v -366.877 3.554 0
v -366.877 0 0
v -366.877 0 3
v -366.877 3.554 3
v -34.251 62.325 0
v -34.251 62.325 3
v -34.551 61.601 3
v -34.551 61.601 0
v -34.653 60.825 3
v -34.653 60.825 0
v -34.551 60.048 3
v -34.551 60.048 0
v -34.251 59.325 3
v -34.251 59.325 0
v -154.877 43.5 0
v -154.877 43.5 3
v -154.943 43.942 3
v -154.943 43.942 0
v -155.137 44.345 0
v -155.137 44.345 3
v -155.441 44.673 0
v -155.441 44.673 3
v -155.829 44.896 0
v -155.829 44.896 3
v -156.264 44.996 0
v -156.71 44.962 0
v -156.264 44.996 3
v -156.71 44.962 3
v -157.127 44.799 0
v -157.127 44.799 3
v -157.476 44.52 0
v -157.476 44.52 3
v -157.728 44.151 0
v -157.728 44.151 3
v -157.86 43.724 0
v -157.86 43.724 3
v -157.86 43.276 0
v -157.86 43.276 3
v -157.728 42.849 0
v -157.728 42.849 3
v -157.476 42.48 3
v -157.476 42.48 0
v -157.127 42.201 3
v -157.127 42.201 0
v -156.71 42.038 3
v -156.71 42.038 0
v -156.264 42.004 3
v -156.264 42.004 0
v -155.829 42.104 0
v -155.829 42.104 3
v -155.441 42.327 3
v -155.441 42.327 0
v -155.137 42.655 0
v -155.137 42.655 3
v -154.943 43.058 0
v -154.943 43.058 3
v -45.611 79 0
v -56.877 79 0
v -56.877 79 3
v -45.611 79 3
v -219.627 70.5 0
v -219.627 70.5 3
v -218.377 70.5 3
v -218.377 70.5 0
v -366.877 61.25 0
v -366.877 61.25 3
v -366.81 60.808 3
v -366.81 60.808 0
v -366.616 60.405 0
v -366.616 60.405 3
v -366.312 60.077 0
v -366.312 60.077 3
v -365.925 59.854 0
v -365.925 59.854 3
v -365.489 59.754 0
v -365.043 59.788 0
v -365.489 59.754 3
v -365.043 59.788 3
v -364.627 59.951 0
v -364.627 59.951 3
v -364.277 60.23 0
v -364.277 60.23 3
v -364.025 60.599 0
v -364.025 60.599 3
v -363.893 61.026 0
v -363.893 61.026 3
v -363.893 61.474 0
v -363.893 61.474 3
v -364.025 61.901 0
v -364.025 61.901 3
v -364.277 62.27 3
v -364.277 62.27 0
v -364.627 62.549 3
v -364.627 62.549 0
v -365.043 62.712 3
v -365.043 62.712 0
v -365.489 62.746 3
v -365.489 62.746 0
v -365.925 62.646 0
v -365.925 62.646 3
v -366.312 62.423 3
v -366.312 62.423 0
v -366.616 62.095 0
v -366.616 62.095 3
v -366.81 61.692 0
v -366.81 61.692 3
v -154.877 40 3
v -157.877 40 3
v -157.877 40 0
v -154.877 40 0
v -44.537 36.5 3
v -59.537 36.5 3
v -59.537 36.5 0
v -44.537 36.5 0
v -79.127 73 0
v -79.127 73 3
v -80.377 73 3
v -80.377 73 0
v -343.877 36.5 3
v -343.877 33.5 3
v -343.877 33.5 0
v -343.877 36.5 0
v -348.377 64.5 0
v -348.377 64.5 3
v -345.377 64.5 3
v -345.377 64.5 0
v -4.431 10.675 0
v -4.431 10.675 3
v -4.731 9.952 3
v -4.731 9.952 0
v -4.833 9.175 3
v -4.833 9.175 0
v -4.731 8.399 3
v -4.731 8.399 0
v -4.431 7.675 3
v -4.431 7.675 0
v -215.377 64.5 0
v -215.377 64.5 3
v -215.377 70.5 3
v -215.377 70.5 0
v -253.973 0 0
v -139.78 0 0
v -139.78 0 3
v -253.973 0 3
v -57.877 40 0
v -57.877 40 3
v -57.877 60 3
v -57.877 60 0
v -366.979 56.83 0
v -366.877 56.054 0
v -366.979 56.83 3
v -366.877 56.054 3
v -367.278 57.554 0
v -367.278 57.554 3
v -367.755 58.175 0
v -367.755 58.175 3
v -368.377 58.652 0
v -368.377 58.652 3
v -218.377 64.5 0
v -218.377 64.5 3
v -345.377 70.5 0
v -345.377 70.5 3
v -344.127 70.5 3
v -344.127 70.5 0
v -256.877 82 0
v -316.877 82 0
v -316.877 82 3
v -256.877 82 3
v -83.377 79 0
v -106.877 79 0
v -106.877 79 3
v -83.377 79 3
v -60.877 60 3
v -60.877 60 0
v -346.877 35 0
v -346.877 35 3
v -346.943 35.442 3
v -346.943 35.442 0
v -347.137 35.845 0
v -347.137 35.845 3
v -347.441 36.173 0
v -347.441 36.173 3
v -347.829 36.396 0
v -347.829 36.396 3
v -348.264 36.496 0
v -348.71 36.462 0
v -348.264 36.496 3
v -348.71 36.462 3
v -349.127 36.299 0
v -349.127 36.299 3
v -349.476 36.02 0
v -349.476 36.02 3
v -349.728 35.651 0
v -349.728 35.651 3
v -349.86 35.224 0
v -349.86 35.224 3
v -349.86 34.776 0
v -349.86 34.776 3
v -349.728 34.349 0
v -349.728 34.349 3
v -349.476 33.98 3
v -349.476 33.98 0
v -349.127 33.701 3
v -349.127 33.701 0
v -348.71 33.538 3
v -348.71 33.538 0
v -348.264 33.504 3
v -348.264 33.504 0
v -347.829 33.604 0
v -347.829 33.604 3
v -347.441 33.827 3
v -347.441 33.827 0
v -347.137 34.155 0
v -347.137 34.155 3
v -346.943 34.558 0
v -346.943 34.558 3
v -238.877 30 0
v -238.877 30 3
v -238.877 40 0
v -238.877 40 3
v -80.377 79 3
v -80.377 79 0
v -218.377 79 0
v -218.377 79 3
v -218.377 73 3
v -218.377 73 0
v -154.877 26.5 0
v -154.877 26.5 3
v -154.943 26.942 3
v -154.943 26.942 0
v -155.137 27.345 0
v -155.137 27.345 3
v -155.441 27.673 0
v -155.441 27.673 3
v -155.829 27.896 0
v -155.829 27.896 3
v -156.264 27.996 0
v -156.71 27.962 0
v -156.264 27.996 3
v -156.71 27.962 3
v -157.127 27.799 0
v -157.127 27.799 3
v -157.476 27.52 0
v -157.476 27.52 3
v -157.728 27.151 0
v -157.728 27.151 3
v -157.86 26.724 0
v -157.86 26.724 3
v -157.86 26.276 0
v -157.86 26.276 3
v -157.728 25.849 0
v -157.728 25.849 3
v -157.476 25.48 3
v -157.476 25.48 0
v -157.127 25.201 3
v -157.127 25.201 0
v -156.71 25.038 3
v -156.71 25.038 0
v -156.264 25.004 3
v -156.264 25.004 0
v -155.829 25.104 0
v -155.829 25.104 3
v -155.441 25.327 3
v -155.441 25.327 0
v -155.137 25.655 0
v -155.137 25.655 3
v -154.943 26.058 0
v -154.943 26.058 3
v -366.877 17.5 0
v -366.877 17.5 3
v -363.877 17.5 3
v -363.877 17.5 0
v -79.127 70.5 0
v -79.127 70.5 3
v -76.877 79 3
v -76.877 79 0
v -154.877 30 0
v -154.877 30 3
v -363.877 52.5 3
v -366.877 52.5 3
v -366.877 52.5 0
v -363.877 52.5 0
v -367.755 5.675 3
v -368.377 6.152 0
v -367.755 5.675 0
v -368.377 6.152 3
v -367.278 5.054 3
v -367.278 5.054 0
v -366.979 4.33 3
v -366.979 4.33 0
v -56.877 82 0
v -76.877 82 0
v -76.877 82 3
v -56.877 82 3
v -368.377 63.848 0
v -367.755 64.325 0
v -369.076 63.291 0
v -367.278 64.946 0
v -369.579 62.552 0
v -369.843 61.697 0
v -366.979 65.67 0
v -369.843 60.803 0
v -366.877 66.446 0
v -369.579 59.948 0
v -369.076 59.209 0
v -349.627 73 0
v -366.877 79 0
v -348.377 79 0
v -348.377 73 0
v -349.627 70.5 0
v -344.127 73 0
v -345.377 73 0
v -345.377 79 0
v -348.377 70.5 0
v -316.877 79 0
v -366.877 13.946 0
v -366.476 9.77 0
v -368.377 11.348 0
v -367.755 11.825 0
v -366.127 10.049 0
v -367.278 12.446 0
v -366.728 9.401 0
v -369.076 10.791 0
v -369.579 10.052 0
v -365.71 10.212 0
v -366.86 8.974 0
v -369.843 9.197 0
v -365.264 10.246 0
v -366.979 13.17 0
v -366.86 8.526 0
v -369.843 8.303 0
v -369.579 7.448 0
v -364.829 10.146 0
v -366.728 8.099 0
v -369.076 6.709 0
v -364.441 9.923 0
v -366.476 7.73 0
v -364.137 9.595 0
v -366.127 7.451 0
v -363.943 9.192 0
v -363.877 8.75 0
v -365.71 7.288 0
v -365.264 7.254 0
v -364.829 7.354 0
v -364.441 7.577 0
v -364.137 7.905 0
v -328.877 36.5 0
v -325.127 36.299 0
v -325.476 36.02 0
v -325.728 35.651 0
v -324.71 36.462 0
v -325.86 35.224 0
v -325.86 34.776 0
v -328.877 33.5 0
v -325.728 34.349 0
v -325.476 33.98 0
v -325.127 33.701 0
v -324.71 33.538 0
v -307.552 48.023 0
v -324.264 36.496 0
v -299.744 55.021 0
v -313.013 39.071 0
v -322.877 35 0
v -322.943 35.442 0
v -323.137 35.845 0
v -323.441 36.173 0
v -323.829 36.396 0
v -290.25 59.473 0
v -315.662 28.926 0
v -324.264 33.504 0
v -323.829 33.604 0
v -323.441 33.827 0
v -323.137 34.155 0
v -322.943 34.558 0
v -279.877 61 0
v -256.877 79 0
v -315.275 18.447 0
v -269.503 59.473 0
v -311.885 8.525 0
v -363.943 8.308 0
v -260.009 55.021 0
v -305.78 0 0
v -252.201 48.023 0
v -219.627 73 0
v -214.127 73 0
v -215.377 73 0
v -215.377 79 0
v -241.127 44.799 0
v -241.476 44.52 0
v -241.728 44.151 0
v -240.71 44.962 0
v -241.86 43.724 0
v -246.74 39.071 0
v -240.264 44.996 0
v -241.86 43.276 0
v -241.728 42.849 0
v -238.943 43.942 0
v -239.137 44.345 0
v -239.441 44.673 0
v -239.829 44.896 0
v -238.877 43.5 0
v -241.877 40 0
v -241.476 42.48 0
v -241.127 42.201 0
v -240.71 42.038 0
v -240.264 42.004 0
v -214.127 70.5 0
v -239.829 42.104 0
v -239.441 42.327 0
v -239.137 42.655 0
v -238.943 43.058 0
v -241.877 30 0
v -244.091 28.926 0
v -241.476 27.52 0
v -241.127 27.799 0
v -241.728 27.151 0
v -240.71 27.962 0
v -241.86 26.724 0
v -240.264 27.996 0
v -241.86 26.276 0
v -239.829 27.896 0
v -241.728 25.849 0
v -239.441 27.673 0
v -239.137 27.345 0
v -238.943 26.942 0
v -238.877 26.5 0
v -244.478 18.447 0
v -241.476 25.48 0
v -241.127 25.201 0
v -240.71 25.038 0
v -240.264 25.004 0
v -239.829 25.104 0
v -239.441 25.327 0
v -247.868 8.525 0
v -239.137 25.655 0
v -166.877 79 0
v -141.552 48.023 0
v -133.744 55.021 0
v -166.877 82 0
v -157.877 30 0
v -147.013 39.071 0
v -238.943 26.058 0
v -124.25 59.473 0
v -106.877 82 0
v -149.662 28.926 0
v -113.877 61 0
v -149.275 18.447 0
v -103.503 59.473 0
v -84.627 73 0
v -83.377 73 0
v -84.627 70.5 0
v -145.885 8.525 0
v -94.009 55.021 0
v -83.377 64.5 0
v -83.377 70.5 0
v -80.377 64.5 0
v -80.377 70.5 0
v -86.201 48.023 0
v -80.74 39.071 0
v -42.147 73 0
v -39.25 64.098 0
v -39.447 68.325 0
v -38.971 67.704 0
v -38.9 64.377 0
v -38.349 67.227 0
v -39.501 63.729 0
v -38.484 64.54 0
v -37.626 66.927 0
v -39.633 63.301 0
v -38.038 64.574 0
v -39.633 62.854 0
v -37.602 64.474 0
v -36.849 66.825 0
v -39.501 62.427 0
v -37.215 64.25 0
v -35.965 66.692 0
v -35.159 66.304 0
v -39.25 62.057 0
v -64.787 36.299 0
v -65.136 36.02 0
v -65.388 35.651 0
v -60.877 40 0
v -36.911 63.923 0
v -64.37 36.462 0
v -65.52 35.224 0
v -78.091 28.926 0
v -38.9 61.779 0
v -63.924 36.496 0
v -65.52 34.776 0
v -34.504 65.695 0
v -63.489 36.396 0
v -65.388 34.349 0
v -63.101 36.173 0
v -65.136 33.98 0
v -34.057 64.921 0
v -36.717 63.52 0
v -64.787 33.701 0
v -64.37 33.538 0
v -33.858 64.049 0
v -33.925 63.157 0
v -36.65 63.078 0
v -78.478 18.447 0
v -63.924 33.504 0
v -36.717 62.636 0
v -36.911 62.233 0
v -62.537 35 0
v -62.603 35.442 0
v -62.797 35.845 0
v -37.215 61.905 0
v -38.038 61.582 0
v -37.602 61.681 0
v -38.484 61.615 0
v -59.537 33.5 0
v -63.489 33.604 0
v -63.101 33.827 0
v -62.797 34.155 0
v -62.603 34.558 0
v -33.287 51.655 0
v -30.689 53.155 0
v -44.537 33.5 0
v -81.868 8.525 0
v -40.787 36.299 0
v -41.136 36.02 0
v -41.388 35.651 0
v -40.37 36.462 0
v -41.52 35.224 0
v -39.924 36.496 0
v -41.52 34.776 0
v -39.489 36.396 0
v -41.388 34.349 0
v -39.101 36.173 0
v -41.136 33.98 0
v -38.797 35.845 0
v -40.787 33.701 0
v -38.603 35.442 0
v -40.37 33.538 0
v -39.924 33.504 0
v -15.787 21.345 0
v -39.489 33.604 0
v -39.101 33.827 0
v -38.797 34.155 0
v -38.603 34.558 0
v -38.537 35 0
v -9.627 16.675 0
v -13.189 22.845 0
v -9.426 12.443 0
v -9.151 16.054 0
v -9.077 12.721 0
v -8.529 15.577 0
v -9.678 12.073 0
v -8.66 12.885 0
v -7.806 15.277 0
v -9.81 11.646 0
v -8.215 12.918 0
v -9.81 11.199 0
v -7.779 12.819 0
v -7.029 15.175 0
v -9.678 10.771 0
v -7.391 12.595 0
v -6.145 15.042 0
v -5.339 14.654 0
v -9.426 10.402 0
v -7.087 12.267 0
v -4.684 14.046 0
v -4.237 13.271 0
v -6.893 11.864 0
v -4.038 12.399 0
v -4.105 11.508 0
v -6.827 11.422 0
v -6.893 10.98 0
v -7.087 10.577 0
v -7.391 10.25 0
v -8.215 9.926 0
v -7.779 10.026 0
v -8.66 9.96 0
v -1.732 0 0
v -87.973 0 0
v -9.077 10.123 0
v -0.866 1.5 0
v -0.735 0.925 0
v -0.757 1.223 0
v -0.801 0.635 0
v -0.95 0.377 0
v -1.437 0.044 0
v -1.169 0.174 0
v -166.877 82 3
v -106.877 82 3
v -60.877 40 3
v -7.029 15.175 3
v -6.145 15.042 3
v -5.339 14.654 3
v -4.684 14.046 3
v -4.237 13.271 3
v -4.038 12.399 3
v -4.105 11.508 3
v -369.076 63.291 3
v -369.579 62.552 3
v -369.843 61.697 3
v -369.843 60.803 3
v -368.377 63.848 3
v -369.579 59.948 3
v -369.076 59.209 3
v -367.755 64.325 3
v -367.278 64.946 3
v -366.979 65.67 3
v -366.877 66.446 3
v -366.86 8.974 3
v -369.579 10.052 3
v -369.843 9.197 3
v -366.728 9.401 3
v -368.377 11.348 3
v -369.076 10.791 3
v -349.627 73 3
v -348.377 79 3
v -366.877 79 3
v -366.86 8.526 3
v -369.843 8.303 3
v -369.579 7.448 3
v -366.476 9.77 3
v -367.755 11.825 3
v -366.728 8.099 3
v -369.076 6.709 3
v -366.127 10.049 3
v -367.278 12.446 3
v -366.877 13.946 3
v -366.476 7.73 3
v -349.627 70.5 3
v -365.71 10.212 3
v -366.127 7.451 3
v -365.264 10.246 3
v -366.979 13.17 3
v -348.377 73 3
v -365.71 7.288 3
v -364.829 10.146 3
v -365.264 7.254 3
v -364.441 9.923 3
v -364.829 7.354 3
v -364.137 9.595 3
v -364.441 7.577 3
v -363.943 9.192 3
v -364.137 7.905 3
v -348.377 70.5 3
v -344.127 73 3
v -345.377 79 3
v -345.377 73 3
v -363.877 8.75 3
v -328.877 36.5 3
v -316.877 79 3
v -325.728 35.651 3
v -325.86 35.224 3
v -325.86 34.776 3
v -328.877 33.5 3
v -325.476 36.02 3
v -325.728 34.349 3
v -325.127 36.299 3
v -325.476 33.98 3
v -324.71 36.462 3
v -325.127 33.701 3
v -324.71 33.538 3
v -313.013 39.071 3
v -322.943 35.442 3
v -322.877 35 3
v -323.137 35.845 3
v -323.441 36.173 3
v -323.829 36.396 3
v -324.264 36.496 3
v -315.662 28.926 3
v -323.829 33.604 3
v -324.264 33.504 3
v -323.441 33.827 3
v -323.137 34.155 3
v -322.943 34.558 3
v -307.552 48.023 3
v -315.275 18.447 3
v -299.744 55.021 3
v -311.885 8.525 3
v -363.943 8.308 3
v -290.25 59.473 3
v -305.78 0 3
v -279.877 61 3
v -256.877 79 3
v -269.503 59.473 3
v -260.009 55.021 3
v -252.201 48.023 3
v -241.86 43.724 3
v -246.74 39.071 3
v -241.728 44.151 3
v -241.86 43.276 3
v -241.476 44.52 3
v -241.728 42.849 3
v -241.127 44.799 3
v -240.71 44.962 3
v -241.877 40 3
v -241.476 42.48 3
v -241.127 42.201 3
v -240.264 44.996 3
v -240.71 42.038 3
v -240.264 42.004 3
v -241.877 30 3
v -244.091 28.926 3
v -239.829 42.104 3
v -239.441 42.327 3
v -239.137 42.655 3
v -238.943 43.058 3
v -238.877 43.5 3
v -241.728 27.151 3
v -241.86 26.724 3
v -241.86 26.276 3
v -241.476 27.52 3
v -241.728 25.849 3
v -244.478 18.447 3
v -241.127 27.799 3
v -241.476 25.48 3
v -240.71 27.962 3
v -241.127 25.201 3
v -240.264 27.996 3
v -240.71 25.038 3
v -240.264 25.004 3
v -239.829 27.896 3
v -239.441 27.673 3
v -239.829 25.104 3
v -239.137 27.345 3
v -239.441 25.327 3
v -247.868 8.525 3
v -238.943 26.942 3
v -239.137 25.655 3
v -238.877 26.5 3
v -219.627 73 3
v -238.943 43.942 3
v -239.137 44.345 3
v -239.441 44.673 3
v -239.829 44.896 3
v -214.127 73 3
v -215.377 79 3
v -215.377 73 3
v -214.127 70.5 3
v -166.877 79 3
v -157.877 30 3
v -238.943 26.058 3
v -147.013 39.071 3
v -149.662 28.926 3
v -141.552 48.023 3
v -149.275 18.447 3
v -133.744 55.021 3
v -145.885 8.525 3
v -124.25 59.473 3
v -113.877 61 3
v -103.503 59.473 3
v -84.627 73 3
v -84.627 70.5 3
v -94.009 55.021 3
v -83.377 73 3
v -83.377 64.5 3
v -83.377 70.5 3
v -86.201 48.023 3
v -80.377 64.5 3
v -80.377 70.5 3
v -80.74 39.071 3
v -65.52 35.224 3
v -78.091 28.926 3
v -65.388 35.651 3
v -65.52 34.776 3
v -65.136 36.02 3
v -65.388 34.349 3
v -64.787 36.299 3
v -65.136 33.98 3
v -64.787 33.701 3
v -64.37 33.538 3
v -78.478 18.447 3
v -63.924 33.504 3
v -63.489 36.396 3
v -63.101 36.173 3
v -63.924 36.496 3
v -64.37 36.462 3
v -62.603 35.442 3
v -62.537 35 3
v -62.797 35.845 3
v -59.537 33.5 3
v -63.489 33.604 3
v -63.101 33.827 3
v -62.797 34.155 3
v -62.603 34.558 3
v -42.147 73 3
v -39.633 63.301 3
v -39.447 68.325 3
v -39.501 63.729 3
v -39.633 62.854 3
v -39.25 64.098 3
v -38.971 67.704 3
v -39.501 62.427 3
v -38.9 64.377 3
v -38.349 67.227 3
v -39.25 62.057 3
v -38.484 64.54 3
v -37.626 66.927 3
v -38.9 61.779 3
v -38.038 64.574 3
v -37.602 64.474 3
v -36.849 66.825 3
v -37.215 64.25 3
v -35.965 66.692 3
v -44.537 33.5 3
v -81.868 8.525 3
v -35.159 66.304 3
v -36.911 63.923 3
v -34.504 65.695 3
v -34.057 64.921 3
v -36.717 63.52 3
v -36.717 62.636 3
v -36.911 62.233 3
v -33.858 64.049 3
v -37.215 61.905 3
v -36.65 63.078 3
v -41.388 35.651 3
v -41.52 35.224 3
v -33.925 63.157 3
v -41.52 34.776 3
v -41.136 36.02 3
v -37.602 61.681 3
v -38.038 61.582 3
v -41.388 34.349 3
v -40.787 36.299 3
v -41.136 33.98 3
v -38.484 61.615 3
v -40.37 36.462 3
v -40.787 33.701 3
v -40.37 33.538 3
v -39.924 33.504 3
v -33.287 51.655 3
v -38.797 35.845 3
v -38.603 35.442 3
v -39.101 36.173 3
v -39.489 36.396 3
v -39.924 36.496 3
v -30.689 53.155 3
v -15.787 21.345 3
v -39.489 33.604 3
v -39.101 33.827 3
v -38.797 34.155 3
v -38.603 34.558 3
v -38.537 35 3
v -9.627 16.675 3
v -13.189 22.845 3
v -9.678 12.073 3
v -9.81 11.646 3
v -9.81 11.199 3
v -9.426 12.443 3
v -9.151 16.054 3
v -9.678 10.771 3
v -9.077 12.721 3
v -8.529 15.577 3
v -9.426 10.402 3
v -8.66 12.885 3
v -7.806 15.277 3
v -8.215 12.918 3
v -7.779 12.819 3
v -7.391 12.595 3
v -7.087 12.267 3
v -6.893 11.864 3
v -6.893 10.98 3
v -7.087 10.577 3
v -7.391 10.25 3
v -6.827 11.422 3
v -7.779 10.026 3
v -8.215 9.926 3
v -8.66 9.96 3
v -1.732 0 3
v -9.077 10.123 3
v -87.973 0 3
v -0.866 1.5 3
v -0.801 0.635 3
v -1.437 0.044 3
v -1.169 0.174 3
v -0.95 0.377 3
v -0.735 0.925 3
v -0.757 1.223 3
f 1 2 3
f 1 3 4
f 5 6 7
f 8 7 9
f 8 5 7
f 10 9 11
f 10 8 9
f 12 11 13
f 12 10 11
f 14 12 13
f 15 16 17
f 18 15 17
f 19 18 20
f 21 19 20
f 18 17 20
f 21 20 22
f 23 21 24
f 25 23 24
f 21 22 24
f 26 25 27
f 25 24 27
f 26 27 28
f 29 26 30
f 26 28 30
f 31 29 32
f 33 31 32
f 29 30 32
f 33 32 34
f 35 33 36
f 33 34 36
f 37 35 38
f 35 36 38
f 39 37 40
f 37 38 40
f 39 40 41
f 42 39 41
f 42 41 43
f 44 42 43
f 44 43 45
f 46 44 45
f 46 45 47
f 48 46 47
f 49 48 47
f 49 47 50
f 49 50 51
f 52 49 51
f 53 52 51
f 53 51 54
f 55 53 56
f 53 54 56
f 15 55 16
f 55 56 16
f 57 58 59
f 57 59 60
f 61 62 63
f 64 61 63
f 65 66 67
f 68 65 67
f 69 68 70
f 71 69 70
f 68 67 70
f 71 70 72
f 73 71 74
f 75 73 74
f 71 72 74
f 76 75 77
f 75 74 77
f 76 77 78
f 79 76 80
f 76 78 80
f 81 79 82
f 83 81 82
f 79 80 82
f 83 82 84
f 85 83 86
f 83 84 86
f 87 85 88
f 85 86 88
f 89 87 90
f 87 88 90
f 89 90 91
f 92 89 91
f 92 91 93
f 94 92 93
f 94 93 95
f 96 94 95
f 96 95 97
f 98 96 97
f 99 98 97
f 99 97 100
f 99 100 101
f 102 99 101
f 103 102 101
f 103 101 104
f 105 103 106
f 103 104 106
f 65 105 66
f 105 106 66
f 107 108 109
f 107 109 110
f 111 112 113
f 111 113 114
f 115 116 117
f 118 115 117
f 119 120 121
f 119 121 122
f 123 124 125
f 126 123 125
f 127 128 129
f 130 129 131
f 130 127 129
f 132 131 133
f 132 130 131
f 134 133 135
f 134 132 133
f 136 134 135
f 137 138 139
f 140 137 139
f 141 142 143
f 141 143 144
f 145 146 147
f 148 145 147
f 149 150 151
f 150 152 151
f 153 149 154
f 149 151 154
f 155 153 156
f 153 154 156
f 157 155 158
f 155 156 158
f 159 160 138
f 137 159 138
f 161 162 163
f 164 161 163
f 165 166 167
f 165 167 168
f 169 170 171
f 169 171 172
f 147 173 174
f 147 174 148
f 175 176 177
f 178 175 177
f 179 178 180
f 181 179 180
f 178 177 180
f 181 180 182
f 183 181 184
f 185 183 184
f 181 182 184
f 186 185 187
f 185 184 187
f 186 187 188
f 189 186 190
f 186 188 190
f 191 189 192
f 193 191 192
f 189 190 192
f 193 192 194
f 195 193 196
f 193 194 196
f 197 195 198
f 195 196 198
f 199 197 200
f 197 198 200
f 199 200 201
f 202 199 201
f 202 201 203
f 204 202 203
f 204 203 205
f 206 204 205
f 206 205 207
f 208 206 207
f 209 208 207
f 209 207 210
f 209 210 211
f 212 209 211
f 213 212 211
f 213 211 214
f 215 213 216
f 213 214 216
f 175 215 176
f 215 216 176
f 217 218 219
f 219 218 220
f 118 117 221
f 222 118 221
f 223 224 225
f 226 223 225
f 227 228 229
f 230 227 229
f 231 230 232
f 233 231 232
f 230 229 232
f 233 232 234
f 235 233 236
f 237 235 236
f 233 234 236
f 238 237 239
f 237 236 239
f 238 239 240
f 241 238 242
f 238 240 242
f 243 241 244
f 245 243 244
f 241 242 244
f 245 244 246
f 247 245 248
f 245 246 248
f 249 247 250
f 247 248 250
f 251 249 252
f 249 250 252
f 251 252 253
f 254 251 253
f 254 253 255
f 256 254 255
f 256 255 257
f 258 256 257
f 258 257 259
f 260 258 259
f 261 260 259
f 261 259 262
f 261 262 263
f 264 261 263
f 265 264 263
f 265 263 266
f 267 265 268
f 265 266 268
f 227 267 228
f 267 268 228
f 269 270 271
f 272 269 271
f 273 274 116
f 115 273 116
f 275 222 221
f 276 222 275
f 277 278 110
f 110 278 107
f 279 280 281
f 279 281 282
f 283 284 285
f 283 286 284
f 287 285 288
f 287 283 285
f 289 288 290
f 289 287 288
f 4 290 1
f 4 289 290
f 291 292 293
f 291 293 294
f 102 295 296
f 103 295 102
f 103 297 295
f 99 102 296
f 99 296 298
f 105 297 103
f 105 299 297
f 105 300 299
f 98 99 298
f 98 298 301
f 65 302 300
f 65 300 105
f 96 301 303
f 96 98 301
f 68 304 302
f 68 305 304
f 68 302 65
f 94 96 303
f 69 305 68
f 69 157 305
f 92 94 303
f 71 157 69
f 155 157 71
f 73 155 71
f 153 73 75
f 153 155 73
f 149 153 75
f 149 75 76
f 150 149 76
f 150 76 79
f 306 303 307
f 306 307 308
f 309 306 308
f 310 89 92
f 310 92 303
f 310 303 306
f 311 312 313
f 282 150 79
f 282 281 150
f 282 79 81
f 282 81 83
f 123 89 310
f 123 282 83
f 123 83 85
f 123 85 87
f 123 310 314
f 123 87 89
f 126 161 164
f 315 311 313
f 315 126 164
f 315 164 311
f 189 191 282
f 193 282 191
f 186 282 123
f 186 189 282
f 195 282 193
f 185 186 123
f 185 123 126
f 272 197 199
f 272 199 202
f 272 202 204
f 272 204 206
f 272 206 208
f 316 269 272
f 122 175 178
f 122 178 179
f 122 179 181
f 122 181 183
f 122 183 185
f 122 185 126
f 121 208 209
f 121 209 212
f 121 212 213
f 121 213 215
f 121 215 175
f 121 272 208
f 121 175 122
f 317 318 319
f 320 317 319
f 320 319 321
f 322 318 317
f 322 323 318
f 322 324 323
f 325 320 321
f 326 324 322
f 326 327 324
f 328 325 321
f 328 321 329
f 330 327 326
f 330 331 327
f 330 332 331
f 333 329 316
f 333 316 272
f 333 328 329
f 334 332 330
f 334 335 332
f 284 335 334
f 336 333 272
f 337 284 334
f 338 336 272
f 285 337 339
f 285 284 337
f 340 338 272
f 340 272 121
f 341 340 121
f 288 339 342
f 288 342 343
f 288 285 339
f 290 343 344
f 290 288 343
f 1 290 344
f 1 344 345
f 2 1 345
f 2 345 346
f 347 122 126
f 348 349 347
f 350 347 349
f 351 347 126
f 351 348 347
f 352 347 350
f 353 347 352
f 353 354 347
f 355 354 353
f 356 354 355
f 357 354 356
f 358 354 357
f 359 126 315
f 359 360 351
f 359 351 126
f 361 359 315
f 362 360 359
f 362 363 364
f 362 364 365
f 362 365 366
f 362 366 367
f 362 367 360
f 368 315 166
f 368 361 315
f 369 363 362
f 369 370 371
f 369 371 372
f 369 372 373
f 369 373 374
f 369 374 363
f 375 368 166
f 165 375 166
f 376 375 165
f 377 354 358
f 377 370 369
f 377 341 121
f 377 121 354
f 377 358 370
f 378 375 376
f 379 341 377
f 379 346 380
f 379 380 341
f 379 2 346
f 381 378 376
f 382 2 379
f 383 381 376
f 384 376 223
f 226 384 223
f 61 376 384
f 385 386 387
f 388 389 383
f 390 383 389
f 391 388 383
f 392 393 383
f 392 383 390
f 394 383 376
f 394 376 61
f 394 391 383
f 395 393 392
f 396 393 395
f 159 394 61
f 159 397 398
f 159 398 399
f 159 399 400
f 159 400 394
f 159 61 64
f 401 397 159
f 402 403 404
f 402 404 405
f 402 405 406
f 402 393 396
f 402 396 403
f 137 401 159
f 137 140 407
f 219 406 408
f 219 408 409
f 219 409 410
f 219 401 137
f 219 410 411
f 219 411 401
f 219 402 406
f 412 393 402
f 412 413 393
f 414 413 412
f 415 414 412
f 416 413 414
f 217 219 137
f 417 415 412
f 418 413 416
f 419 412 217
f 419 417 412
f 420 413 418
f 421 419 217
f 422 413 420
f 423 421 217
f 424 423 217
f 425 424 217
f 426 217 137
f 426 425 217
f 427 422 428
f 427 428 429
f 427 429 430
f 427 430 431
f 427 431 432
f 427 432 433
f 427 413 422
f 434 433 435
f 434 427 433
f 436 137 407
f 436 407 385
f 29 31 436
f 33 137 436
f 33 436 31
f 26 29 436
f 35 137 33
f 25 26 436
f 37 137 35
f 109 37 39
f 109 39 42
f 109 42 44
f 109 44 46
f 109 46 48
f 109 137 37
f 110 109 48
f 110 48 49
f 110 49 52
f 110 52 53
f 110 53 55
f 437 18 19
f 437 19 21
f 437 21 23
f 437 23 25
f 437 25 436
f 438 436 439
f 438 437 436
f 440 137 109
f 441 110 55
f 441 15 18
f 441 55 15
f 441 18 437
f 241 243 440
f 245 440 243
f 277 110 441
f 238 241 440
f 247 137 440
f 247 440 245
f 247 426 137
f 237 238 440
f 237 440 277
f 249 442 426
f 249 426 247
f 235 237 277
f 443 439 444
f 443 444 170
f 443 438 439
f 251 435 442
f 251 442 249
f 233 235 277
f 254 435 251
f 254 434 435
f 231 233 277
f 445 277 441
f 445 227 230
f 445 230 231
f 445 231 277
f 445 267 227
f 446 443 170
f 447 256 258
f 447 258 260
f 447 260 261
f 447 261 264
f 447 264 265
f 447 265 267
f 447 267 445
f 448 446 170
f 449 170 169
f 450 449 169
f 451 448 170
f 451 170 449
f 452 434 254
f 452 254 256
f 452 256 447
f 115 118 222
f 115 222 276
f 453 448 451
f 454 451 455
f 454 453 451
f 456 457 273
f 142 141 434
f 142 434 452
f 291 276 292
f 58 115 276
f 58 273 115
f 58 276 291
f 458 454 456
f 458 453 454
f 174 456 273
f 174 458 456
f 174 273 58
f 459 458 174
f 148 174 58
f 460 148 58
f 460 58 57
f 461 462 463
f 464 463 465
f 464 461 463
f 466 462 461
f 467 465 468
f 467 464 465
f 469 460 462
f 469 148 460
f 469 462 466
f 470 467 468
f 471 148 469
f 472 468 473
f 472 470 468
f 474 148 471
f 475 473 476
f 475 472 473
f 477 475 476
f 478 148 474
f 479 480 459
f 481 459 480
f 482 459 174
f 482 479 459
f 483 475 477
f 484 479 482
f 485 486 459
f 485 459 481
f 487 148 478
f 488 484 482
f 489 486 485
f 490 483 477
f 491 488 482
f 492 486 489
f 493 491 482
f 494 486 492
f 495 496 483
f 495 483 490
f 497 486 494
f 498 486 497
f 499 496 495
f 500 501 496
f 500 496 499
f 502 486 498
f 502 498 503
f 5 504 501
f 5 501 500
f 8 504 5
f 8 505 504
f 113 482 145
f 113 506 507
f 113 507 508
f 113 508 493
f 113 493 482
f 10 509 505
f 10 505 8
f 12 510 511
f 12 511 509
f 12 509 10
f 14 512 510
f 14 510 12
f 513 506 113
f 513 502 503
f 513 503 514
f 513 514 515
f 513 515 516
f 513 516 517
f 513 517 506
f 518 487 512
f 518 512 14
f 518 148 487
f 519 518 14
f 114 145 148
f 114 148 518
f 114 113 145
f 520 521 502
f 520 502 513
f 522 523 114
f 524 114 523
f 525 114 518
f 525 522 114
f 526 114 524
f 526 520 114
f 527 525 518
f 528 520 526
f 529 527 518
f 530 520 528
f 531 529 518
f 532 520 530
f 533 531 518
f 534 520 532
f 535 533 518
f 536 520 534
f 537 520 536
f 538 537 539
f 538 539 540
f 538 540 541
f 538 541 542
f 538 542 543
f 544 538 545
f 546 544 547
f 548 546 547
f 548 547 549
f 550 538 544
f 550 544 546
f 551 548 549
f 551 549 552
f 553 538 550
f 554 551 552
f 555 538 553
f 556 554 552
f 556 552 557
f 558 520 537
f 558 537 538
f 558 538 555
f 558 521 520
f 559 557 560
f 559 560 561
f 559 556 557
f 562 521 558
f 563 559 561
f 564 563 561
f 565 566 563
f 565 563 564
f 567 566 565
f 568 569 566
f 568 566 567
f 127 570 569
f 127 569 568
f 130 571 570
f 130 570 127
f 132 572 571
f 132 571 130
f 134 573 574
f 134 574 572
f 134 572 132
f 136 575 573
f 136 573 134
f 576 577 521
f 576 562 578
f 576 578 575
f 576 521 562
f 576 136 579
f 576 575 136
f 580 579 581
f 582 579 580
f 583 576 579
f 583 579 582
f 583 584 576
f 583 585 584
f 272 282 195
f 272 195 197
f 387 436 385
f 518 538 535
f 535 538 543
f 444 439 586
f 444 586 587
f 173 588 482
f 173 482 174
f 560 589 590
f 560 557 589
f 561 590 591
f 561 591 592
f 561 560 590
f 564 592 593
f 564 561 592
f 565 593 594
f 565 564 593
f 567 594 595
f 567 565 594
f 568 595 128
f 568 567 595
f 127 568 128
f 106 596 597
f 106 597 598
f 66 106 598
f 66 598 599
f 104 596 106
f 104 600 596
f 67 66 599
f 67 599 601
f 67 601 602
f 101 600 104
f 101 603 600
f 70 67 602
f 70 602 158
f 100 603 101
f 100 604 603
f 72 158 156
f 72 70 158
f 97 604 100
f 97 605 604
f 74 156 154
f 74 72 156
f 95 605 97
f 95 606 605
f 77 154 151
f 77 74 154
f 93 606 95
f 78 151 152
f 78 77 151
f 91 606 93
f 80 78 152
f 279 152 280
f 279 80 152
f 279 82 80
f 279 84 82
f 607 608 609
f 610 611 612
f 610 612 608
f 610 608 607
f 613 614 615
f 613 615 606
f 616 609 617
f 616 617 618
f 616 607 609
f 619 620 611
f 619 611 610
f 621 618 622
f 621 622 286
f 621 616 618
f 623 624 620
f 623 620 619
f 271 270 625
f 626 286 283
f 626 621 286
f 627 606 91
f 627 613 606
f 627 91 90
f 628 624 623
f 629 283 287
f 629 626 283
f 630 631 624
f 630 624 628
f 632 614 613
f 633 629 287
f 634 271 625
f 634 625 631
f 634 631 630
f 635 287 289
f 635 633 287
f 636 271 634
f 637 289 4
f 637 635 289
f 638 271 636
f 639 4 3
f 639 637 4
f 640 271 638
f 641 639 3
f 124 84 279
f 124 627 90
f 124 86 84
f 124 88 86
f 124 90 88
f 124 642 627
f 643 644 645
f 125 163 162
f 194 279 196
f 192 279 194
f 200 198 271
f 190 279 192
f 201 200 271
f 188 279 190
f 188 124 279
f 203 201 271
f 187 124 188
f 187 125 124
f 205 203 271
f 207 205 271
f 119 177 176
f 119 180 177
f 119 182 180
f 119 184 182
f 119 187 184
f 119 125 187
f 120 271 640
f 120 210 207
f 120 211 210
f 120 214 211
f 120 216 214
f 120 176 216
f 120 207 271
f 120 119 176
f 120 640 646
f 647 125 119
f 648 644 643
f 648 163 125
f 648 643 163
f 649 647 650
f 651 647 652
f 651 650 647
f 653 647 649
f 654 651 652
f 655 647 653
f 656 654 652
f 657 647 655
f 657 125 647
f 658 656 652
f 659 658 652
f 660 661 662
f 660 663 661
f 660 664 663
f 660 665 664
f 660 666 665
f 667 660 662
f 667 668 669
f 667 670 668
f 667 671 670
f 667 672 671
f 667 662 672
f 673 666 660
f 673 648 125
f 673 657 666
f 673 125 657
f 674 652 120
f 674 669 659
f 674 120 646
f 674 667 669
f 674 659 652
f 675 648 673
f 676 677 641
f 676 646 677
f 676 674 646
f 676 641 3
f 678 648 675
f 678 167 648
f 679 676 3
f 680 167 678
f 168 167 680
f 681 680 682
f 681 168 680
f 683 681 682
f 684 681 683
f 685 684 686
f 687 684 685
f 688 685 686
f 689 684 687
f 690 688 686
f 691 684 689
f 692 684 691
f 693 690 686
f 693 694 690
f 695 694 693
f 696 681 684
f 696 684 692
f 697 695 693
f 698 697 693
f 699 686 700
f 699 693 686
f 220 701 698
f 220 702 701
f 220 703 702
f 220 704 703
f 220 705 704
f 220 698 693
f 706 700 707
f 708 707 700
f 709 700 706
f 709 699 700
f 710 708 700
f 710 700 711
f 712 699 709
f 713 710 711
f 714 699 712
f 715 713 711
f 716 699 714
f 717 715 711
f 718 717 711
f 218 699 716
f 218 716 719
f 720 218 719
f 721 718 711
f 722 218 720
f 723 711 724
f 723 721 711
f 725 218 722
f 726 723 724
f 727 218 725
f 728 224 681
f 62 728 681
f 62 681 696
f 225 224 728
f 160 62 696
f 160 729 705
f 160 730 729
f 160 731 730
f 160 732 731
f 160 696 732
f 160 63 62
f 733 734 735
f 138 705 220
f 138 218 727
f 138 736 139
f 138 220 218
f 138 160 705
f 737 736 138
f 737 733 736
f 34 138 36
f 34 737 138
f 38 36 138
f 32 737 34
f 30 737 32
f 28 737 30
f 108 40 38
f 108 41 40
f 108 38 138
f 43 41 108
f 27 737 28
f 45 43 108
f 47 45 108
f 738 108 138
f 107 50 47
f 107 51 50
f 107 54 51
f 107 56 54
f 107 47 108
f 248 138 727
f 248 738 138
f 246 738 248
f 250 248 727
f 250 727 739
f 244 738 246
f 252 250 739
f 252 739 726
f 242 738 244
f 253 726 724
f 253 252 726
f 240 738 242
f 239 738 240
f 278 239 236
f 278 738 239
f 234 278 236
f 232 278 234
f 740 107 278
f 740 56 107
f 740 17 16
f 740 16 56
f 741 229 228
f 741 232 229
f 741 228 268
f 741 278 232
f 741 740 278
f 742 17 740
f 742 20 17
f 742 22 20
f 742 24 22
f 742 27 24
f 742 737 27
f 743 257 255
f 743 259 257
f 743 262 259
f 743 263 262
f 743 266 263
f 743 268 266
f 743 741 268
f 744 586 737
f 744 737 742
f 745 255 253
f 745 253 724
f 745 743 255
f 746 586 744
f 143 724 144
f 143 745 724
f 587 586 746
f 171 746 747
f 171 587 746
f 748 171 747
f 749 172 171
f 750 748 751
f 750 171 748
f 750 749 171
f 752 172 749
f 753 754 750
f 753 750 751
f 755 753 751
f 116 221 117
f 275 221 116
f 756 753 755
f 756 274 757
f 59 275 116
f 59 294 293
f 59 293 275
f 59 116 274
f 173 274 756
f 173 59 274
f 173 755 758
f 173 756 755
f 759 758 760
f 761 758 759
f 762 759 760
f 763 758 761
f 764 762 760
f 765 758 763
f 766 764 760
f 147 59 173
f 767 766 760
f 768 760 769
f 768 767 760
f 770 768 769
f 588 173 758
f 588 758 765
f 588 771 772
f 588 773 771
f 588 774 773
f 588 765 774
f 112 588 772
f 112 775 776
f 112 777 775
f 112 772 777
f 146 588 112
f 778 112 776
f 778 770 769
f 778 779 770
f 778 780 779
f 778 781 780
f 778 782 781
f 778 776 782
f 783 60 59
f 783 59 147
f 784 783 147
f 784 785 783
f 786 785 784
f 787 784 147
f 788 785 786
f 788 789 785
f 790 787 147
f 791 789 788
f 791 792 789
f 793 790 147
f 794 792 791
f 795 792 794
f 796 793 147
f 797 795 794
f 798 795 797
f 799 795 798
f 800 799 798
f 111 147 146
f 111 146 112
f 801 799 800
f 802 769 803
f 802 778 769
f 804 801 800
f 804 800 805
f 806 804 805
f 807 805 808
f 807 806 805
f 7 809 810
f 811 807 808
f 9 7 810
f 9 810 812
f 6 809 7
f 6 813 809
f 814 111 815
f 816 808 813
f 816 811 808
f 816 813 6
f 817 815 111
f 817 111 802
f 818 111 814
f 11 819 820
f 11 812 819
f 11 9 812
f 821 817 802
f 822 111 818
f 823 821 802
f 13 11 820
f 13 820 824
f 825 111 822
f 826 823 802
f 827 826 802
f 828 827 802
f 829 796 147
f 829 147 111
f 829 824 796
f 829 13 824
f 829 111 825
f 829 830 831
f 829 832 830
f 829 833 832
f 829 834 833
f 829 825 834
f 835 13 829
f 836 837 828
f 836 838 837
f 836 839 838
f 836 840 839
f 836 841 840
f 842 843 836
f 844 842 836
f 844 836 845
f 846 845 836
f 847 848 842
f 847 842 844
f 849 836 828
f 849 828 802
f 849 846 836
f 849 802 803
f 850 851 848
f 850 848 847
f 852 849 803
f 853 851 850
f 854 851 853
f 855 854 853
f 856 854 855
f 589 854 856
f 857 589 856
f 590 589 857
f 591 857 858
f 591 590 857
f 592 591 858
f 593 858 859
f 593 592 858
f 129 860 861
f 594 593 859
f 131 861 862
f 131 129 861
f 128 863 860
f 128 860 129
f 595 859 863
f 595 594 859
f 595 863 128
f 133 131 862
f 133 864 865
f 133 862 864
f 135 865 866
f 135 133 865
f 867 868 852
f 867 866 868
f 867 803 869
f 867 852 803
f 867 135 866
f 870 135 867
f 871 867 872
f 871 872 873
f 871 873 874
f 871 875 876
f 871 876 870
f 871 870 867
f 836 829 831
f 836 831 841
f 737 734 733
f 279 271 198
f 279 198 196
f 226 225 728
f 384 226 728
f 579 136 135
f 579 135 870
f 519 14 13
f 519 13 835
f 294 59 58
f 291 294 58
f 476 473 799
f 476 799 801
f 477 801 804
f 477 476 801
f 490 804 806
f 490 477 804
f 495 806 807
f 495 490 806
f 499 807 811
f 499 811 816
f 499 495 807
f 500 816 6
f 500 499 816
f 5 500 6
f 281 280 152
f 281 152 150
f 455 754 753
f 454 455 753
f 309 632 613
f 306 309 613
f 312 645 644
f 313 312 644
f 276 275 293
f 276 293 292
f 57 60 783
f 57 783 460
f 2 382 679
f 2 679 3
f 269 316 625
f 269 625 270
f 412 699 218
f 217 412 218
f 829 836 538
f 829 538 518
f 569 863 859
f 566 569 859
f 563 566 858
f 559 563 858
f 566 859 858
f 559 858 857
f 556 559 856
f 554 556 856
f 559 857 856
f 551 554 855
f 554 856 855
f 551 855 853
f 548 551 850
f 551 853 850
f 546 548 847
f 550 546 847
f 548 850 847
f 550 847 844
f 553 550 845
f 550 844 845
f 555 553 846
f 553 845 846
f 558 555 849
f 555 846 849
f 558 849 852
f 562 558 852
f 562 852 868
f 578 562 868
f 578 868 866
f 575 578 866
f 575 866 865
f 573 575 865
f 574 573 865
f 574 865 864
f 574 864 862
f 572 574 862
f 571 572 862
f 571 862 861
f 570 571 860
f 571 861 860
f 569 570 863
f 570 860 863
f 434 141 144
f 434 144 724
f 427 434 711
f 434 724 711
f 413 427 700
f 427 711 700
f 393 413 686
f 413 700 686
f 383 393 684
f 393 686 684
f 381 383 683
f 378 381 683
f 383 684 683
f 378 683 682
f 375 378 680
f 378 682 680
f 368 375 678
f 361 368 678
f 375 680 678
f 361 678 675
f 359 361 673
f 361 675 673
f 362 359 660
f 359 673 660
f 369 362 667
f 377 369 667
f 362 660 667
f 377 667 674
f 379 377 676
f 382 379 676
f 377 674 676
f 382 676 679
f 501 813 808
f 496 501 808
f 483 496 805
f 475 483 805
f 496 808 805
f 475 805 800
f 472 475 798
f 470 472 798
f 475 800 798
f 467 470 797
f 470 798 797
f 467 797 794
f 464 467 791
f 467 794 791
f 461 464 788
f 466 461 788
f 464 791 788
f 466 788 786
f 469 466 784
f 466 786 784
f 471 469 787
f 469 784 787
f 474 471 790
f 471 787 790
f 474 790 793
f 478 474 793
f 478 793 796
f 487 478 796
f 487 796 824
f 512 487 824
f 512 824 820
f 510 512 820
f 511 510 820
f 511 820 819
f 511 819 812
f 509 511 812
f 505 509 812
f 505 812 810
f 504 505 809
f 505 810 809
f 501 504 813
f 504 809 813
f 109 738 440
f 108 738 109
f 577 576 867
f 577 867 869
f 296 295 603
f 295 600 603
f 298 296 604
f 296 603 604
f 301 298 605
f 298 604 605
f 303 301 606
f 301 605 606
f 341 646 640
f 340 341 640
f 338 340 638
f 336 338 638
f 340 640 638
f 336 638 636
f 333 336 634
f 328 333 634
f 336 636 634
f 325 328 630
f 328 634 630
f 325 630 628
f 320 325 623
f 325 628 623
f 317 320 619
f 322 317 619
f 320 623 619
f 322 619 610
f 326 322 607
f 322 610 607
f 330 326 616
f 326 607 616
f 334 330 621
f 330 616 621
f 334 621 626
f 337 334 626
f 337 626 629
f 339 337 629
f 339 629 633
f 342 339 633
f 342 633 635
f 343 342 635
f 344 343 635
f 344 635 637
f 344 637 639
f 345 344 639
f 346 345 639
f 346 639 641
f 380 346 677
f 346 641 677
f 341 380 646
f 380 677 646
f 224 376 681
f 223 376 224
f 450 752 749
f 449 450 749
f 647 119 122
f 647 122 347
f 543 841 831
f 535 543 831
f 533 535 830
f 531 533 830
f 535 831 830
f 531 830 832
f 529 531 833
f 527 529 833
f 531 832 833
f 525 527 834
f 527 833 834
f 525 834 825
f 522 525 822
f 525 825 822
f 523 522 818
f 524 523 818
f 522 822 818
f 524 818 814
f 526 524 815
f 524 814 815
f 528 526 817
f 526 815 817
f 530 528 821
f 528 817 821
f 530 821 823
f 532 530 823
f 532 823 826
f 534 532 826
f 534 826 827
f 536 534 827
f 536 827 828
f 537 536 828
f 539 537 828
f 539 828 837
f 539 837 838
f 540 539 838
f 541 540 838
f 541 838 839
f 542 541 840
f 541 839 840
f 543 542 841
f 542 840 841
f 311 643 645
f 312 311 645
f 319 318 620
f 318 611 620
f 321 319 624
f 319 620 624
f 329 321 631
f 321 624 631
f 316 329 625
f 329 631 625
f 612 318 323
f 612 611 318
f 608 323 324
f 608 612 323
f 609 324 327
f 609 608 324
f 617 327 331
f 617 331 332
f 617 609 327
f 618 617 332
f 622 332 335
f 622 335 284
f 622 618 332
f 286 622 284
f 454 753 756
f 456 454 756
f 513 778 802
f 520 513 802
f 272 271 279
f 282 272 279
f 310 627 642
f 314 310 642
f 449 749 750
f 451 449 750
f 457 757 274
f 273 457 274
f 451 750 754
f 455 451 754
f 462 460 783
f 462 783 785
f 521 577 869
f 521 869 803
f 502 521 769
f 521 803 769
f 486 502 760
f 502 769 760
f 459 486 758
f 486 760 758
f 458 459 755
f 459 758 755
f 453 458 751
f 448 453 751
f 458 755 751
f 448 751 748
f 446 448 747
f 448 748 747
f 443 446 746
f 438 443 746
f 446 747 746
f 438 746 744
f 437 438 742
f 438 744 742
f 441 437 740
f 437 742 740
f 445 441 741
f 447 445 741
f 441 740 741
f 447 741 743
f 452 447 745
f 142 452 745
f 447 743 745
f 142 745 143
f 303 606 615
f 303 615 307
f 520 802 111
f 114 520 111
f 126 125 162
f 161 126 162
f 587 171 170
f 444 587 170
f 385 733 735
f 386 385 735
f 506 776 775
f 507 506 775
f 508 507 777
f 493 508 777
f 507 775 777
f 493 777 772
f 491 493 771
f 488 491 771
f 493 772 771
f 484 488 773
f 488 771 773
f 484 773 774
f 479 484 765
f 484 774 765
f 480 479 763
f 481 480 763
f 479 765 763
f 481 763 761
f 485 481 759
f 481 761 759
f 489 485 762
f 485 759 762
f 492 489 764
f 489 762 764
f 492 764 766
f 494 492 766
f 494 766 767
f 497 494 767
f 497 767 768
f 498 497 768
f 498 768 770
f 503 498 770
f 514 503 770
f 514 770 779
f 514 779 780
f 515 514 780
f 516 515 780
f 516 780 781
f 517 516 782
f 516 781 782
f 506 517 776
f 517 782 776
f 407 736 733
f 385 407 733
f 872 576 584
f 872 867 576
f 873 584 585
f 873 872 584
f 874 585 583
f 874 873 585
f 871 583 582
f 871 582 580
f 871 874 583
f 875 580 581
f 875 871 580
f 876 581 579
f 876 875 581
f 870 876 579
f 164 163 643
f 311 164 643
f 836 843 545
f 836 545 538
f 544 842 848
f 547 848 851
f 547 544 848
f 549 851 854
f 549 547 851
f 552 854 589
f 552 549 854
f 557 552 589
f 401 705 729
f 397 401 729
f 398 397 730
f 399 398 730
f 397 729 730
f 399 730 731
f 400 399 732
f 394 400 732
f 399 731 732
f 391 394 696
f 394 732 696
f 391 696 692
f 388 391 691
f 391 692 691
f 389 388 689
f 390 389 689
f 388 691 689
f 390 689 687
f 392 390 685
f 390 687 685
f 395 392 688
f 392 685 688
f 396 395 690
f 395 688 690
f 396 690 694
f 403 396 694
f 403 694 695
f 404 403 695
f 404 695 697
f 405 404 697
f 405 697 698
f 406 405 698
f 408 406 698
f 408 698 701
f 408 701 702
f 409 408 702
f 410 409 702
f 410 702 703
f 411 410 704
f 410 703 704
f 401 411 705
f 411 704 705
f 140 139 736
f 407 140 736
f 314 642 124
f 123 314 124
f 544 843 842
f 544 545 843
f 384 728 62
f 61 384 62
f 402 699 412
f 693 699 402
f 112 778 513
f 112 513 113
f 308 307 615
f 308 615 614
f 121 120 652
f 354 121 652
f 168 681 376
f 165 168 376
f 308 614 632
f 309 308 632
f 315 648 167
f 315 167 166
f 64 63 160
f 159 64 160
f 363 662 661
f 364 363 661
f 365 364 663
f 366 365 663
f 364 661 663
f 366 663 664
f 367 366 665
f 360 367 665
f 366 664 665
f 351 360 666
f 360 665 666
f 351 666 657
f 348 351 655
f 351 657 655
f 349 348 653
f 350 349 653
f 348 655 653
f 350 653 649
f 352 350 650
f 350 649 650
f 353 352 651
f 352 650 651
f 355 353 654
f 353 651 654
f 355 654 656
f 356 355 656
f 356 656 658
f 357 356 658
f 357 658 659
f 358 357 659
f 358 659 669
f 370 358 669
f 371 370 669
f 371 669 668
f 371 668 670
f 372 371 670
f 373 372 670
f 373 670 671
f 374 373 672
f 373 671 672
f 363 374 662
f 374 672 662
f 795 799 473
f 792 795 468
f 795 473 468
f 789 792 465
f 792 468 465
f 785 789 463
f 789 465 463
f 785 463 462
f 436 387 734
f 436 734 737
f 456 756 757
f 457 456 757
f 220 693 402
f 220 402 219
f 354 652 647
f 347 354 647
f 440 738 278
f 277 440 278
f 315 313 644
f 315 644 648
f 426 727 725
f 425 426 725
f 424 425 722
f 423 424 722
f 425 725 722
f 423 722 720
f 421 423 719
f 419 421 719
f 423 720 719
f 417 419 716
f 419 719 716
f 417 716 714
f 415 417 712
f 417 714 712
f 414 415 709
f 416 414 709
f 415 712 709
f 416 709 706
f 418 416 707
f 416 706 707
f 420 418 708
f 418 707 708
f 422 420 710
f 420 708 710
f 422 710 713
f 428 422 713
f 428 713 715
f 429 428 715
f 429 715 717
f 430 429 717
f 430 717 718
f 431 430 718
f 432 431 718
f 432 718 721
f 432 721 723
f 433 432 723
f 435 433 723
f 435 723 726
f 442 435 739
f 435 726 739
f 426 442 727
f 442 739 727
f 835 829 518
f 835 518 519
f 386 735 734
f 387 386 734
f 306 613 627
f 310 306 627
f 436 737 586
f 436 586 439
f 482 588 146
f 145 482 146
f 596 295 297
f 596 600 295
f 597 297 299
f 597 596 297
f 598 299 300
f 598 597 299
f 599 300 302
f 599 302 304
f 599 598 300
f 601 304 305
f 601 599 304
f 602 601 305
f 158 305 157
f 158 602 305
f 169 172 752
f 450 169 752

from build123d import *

# Parameters (mm, degrees)
EXTRUDE_1_DEPTH      = 3
SKETCH_2_W           = 3
SKETCH_2_H           = 35
CUT_EXTRUDE_1_DEPTH  = 3
CUT_EXTRUDE_2_DEPTH  = 3
SKETCH_4_W           = 3
SKETCH_4_H           = 10
CUT_EXTRUDE_3_DEPTH  = 3
SKETCH_5_W           = 15
SKETCH_5_H           = 3
CUT_EXTRUDE_4_DEPTH  = 3
SKETCH_6_W           = 324.73
SKETCH_6_H           = 3
EXTRUDE_2_DEPTH      = 6
SKETCH_8_W           = 3
SKETCH_8_H           = 3
SKETCH_9_W           = 3
SKETCH_9_H           = 3
SKETCH_7_R           = 1.5
CUT_EXTRUDE_6_DEPTH  = 3
FILLET_1_R           = 3
SKETCH_14_R          = 1.5
CUT_EXTRUDE_9_DEPTH  = 3
SKETCH_15_R          = 1.5
CUT_EXTRUDE_10_DEPTH = 3
SKETCH_16_W          = 3
SKETCH_16_H          = 3
SKETCH_17_W          = 3
SKETCH_17_H          = 3
SKETCH_18_R          = 1.5
CUT_EXTRUDE_11_DEPTH = 3
FILLET_2_R           = 3
CHAMFER_1_SIZE2      = 3.464101615
CHAMFER_1_SIZE       = 6
SKETCH_19_R          = 36
CUT_EXTRUDE_12_DEPTH = 3
SKETCH_24_W          = 20
SKETCH_24_H          = 3
SKETCH_24_W_2        = 60
EXTRUDE_3_DEPTH      = 3
CUT_EXTRUDE_13_DEPTH = 3
FILLET_3_R           = 1
SKETCH_26_W          = 3
SKETCH_26_H          = 20
CUT_EXTRUDE_14_DEPTH = 3


with BuildPart() as part:
    # Эскиз1 → Бобышка-Вытянуть1 (new body)
    with BuildSketch(Plane.XY):
        Polygon((-42.146569651, 73), (0, 0), (-366.876569651, 0), (-366.876569651, 73), align=None)
    extrude(amount=EXTRUDE_1_DEPTH)

    # Эскиз2 → Вырез-Вытянуть1 (cut)
    with BuildSketch(Plane.XY.offset(3)):
        with Locations((-365.376569651, 35)):
            Rectangle(SKETCH_2_W, SKETCH_2_H)
    extrude(amount=-CUT_EXTRUDE_1_DEPTH, mode=Mode.SUBTRACT)

    # Эскиз3 → Вырез-Вытянуть2 (cut)
    with BuildSketch(Plane.XY.offset(3)):
        Polygon((-33.287386441, 51.655444566), (-30.689310229, 53.155444566), (-13.189310229, 22.844555434), (-15.787386441, 21.344555434), align=None)
    extrude(amount=-CUT_EXTRUDE_2_DEPTH, mode=Mode.SUBTRACT)

    # Эскиз4 → Вырез-Вытянуть3 (cut)
    with BuildSketch(Plane.XY.offset(3)):
        with Locations((-240.376569651, 35)):
            Rectangle(SKETCH_4_W, SKETCH_4_H)
        with Locations((-156.376569651, 35)):
            Rectangle(SKETCH_4_W, SKETCH_4_H)
    extrude(amount=-CUT_EXTRUDE_3_DEPTH, mode=Mode.SUBTRACT)

    # Эскиз5 → Вырез-Вытянуть4 (cut)
    with BuildSketch(Plane.XY.offset(3)):
        with Locations((-336.376569651, 35)):
            Rectangle(SKETCH_5_W, SKETCH_5_H)
        with Locations((-52.036569651, 35)):
            Rectangle(SKETCH_5_W, SKETCH_5_H)
    extrude(amount=-CUT_EXTRUDE_4_DEPTH, mode=Mode.SUBTRACT)

    # Эскиз6 → Бобышка-Вытянуть2 (add)
    with BuildSketch(Plane(origin=(0, 73, 0), x_dir=(1, 0, 0), z_dir=(0, 1, 0))):
        with Locations((-204.511569651, -1.5)):
            Rectangle(SKETCH_6_W, SKETCH_6_H)
    extrude(amount=EXTRUDE_2_DEPTH)

    # Эскиз8 → Повернуть1 (revolve)
    with BuildSketch(Plane.ZY.offset(366.876569651)):
        with Locations((1.5, 7.25)):
            Rectangle(SKETCH_8_W, SKETCH_8_H)
    revolve(axis=Axis((-366.876569651, 8.75, 0), (0, 0, 1)))

    # Эскиз9 → Повернуть2 (revolve)
    with BuildSketch(Plane.ZY.offset(366.876569651)):
        with Locations((1.5, 59.75)):
            Rectangle(SKETCH_9_W, SKETCH_9_H)
    revolve(axis=Axis((-366.876569651, 61.25, 0), (0, 0, 1)))

    # Эскиз7 → Вырез-Вытянуть6 (cut)
    with BuildSketch(Plane.XY.offset(3)):
        with Locations((-365.376569651, 8.75)):
            Circle(SKETCH_7_R)
        with Locations(Location((-365.376569651, 61.25, 0), (0, 0, 180))):
            Circle(SKETCH_7_R)
    extrude(amount=-CUT_EXTRUDE_6_DEPTH, mode=Mode.SUBTRACT)

    # Скругление1
    fillet_1_edges = [part.edges().sort_by_distance(p)[0] for p in [
        (-366.876569651, 5.75, 1.5),
        (-366.876569651, 11.75, 1.5),
        (-366.876569651, 58.25, 1.5),
        (-366.876569651, 64.25, 1.5),
    ]]
    fillet(fillet_1_edges, radius=FILLET_1_R)

    # Эскиз14 → Вырез-Вытянуть9 (cut)
    with BuildSketch(Plane.XY.offset(3)):
        with Locations((-156.376569651, 43.5)):
            Circle(SKETCH_14_R)
        with Locations((-156.376569651, 26.5)):
            Circle(SKETCH_14_R)
        with Locations((-240.376569651, 26.5)):
            Circle(SKETCH_14_R)
        with Locations((-240.376569651, 43.5)):
            Circle(SKETCH_14_R)
    extrude(amount=-CUT_EXTRUDE_9_DEPTH, mode=Mode.SUBTRACT)

    # Эскиз15 → Вырез-Вытянуть10 (cut)
    with BuildSketch(Plane.XY.offset(3)):
        with Locations((-324.376569651, 35)):
            Circle(SKETCH_15_R)
        with Locations((-348.376569651, 35)):
            Circle(SKETCH_15_R)
        with Locations((-64.036569651, 35)):
            Circle(SKETCH_15_R)
        with Locations((-40.036569651, 35)):
            Circle(SKETCH_15_R)
    extrude(amount=-CUT_EXTRUDE_10_DEPTH, mode=Mode.SUBTRACT)

    # Эскиз16 → Повернуть3 (revolve)
    with BuildSketch(Plane(origin=(0, 0, 0), x_dir=(0, 0, -1), z_dir=(0.8660254037844265, 0.5000000000000212, 0))):
        with Locations((-1.5, 12.558620458)):
            Rectangle(SKETCH_16_W, SKETCH_16_H)
    revolve(axis=Axis((-7.029310229, 12.175122459, 3), (0, 0, -1)))

    # Эскиз17 → Повернуть4 (revolve)
    with BuildSketch(Plane(origin=(0, 0, 0), x_dir=(0, 0, -1), z_dir=(0.8660254037844265, 0.5000000000000212, 0))):
        with Locations((-1.5, 75.198620458)):
            Rectangle(SKETCH_17_W, SKETCH_17_H)
    revolve(axis=Axis((-36.849310229, 63.824877541, 3), (0, 0, -1)))

    # Эскиз18 → Вырез-Вытянуть11 (cut)
    with BuildSketch(Plane.XY.offset(3)):
        with Locations((-38.149990748, 63.077722283)):
            Circle(SKETCH_18_R)
        with Locations((-8.326705922, 11.422277717)):
            Circle(SKETCH_18_R)
    extrude(amount=-CUT_EXTRUDE_11_DEPTH, mode=Mode.SUBTRACT)

    # Скругление2
    fillet_2_edges = [part.edges().sort_by_distance(p)[0] for p in [
        (-5.529310229, 9.577046248, 1.5),
        (-8.529310229, 14.773198671, 1.5),
        (-35.349310229, 61.226801329, 1.5),
        (-38.349310229, 66.422953752, 1.5),
    ]]
    fillet(fillet_2_edges, radius=FILLET_2_R)

    # Фаска1
    chamfer_1_edges = [part.edges().sort_by_distance(p)[0] for p in [
        (-42.146569651, 79, 1.5),
    ]]
    chamfer_1_side = [part.faces().sort_by_distance(p)[0] for p in [
        (-42.146569651, 78.930717968, 1.5),
    ]]
    chamfer(chamfer_1_edges, length=CHAMFER_1_SIZE - 0.0001, length2=CHAMFER_1_SIZE2 - 0.0001, reference=chamfer_1_side[0])  # a hair under: the kernel refuses the full size

    # Эскиз19 → Вырез-Вытянуть12 (cut)
    with BuildSketch(Plane.XY.offset(3)):
        with Locations((-279.876569651, 25)):
            Circle(SKETCH_19_R)
        with Locations((-113.876569651, 25)):
            Circle(SKETCH_19_R)
    extrude(amount=-CUT_EXTRUDE_12_DEPTH, mode=Mode.SUBTRACT)

    # Эскиз24 → Бобышка-Вытянуть3 (add)
    with BuildSketch(Plane(origin=(0, 79, 0), x_dir=(1, 0, 0), z_dir=(0, 1, 0))):
        with Locations((-66.876569651, -1.5)):
            Rectangle(SKETCH_24_W, SKETCH_24_H)
        with Locations((-136.876569651, -1.5)):
            Rectangle(SKETCH_24_W_2, SKETCH_24_H)
        with Locations((-286.876569651, -1.5)):
            Rectangle(SKETCH_24_W_2, SKETCH_24_H)
    extrude(amount=EXTRUDE_3_DEPTH)

    # Эскиз25 → Вырез-Вытянуть13 (cut)
    with BuildSketch(Plane.XY.offset(3)):
        Polygon((-348.376569651, 79), (-348.376569651, 73), (-349.626569651, 73), (-349.626569651, 70.5), (-348.376569651, 70.5), (-348.376569651, 64.5), (-345.376569651, 64.5), (-345.376569651, 70.5), (-344.126569651, 70.5), (-344.126569651, 73), (-345.376569651, 73), (-345.376569651, 79), align=None)
        Polygon((-218.376569651, 79), (-218.376569651, 73), (-219.626569651, 73), (-219.626569651, 70.5), (-218.376569651, 70.5), (-218.376569651, 64.5), (-215.376569651, 64.5), (-215.376569651, 70.5), (-214.126569651, 70.5), (-214.126569651, 73), (-215.376569651, 73), (-215.376569651, 79), align=None)
        Polygon((-83.376569651, 79), (-83.376569651, 73), (-84.626569651, 73), (-84.626569651, 70.5), (-83.376569651, 70.5), (-83.376569651, 64.5), (-80.376569651, 64.5), (-80.376569651, 70.5), (-79.126569651, 70.5), (-79.126569651, 73), (-80.376569651, 73), (-80.376569651, 79), align=None)
    extrude(amount=-CUT_EXTRUDE_13_DEPTH, mode=Mode.SUBTRACT)

    # Скругление3
    fillet_3_edges = [part.edges().sort_by_distance(p)[0] for p in [
        (0, 0, 1.5),
    ]]
    fillet(fillet_3_edges, radius=FILLET_3_R)

    # Эскиз26 → Вырез-Вытянуть14 (cut)
    with BuildSketch(Plane.XY.offset(3)):
        with Locations((-59.376569651, 50)):
            Rectangle(SKETCH_26_W, SKETCH_26_H)
    extrude(amount=-CUT_EXTRUDE_14_DEPTH, mode=Mode.SUBTRACT)


solid = part.part
